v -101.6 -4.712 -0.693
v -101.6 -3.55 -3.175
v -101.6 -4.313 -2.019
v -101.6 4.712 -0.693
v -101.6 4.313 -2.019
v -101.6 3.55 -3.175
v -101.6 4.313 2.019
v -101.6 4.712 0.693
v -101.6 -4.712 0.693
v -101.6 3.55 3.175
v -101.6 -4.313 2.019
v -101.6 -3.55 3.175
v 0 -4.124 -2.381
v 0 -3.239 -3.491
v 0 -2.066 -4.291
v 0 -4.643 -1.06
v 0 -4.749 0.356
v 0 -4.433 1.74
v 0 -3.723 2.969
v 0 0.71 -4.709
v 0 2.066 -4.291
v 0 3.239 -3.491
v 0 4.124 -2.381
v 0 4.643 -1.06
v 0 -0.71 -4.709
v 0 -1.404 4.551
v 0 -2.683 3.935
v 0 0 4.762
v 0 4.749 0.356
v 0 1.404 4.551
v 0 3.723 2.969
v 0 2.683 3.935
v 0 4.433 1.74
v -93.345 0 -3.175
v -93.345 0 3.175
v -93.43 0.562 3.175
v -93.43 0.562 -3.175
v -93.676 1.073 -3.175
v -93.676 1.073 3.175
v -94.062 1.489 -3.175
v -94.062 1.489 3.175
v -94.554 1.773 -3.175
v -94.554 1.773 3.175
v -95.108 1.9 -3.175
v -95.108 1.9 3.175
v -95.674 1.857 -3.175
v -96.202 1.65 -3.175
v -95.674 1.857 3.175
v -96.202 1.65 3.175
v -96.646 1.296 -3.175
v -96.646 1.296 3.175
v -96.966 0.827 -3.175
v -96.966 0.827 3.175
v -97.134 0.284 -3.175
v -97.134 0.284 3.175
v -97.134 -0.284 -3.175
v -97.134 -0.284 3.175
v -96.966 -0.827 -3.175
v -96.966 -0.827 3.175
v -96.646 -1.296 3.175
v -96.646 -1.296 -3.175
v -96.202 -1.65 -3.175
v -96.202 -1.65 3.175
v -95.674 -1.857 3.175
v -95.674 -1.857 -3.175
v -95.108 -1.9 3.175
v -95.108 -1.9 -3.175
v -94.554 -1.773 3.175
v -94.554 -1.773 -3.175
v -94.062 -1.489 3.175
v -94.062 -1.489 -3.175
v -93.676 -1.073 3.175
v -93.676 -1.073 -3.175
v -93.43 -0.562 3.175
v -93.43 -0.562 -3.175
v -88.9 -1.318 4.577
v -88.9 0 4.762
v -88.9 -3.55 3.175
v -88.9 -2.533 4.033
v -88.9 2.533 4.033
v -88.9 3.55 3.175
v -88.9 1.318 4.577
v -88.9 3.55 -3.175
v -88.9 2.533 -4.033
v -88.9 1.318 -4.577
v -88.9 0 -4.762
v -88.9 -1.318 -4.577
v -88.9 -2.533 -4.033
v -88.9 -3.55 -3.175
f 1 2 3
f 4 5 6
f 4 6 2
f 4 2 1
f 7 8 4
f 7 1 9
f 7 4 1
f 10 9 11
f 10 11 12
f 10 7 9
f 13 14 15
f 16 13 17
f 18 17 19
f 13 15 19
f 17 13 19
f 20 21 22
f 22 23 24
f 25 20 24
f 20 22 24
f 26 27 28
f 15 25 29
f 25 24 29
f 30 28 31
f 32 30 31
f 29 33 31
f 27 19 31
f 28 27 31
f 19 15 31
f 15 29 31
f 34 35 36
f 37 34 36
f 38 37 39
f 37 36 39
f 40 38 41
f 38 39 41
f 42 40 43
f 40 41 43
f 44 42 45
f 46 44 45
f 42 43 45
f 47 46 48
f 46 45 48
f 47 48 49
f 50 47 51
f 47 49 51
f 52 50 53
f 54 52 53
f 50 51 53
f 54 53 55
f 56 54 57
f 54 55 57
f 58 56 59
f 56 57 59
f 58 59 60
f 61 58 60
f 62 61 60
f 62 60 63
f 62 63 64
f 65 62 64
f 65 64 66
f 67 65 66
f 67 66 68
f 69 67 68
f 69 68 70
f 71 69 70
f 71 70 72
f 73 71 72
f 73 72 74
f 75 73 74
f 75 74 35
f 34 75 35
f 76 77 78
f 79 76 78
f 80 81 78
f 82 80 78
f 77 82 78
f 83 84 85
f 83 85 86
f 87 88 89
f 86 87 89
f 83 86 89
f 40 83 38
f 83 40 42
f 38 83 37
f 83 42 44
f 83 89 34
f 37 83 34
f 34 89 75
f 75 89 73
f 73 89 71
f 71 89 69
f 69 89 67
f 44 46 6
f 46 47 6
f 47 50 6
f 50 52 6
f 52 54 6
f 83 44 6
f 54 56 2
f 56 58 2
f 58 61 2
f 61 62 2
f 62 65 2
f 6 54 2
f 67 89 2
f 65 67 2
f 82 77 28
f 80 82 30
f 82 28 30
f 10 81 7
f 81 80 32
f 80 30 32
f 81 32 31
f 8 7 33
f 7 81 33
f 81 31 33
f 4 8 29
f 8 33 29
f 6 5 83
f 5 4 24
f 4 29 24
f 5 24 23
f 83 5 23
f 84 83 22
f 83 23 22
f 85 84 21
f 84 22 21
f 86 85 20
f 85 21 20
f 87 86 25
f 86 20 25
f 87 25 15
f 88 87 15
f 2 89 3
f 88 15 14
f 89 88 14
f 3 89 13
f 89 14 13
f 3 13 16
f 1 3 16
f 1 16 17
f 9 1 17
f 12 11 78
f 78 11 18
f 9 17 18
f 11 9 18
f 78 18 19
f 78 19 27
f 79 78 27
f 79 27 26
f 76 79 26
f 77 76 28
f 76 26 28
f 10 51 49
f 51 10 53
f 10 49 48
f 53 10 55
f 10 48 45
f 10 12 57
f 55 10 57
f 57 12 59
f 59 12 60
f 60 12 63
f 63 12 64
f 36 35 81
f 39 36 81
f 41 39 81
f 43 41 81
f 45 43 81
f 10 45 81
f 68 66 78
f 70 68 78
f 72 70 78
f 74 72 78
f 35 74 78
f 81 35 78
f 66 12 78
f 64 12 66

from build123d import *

# Parameters (mm, degrees)
SKETCH2_R               = 4.7625
BASE_EXTRUDE_DEPTH      = 101.6
CUT_EXTRUDE1_DEPTH      = 102.822997464
CUT_EXTRUDE1_DEPTH_BACK = 102.822997464
SKETCH5_R               = 1.905
CUT_EXTRUDE2_DEPTH      = 103.020808233


with BuildPart() as part:
    # Sketch2 → Base-Extrude (new body)
    with BuildSketch(Plane.ZY):
        Circle(SKETCH2_R)
    extrude(amount=BASE_EXTRUDE_DEPTH)

    # Sketch4 → Cut-Extrude1 (cut, two sides: drawn at the far end of the back side and taken through both)
    with BuildSketch(Plane(origin=(0, 0, 0), x_dir=(1, 0, 0), z_dir=(0, 1, 0)).offset(-CUT_EXTRUDE1_DEPTH_BACK)):
        Polygon((-109.22, 12.7), (-88.9, 12.7), (-88.9, 3.175), (-104.14, 3.175), (-104.14, -3.175), (-88.9, -3.175), (-88.9, -12.7), (-109.22, -12.7), align=None)
    extrude(amount=CUT_EXTRUDE1_DEPTH + CUT_EXTRUDE1_DEPTH_BACK, mode=Mode.SUBTRACT)

    # Sketch5 → Cut-Extrude2 (cut, through all)
    with BuildSketch(Plane.XY.offset(3.175)):
        with Locations((-95.25, 0)):
            Circle(SKETCH5_R)
    extrude(amount=-CUT_EXTRUDE2_DEPTH, mode=Mode.SUBTRACT)


solid = part.part
